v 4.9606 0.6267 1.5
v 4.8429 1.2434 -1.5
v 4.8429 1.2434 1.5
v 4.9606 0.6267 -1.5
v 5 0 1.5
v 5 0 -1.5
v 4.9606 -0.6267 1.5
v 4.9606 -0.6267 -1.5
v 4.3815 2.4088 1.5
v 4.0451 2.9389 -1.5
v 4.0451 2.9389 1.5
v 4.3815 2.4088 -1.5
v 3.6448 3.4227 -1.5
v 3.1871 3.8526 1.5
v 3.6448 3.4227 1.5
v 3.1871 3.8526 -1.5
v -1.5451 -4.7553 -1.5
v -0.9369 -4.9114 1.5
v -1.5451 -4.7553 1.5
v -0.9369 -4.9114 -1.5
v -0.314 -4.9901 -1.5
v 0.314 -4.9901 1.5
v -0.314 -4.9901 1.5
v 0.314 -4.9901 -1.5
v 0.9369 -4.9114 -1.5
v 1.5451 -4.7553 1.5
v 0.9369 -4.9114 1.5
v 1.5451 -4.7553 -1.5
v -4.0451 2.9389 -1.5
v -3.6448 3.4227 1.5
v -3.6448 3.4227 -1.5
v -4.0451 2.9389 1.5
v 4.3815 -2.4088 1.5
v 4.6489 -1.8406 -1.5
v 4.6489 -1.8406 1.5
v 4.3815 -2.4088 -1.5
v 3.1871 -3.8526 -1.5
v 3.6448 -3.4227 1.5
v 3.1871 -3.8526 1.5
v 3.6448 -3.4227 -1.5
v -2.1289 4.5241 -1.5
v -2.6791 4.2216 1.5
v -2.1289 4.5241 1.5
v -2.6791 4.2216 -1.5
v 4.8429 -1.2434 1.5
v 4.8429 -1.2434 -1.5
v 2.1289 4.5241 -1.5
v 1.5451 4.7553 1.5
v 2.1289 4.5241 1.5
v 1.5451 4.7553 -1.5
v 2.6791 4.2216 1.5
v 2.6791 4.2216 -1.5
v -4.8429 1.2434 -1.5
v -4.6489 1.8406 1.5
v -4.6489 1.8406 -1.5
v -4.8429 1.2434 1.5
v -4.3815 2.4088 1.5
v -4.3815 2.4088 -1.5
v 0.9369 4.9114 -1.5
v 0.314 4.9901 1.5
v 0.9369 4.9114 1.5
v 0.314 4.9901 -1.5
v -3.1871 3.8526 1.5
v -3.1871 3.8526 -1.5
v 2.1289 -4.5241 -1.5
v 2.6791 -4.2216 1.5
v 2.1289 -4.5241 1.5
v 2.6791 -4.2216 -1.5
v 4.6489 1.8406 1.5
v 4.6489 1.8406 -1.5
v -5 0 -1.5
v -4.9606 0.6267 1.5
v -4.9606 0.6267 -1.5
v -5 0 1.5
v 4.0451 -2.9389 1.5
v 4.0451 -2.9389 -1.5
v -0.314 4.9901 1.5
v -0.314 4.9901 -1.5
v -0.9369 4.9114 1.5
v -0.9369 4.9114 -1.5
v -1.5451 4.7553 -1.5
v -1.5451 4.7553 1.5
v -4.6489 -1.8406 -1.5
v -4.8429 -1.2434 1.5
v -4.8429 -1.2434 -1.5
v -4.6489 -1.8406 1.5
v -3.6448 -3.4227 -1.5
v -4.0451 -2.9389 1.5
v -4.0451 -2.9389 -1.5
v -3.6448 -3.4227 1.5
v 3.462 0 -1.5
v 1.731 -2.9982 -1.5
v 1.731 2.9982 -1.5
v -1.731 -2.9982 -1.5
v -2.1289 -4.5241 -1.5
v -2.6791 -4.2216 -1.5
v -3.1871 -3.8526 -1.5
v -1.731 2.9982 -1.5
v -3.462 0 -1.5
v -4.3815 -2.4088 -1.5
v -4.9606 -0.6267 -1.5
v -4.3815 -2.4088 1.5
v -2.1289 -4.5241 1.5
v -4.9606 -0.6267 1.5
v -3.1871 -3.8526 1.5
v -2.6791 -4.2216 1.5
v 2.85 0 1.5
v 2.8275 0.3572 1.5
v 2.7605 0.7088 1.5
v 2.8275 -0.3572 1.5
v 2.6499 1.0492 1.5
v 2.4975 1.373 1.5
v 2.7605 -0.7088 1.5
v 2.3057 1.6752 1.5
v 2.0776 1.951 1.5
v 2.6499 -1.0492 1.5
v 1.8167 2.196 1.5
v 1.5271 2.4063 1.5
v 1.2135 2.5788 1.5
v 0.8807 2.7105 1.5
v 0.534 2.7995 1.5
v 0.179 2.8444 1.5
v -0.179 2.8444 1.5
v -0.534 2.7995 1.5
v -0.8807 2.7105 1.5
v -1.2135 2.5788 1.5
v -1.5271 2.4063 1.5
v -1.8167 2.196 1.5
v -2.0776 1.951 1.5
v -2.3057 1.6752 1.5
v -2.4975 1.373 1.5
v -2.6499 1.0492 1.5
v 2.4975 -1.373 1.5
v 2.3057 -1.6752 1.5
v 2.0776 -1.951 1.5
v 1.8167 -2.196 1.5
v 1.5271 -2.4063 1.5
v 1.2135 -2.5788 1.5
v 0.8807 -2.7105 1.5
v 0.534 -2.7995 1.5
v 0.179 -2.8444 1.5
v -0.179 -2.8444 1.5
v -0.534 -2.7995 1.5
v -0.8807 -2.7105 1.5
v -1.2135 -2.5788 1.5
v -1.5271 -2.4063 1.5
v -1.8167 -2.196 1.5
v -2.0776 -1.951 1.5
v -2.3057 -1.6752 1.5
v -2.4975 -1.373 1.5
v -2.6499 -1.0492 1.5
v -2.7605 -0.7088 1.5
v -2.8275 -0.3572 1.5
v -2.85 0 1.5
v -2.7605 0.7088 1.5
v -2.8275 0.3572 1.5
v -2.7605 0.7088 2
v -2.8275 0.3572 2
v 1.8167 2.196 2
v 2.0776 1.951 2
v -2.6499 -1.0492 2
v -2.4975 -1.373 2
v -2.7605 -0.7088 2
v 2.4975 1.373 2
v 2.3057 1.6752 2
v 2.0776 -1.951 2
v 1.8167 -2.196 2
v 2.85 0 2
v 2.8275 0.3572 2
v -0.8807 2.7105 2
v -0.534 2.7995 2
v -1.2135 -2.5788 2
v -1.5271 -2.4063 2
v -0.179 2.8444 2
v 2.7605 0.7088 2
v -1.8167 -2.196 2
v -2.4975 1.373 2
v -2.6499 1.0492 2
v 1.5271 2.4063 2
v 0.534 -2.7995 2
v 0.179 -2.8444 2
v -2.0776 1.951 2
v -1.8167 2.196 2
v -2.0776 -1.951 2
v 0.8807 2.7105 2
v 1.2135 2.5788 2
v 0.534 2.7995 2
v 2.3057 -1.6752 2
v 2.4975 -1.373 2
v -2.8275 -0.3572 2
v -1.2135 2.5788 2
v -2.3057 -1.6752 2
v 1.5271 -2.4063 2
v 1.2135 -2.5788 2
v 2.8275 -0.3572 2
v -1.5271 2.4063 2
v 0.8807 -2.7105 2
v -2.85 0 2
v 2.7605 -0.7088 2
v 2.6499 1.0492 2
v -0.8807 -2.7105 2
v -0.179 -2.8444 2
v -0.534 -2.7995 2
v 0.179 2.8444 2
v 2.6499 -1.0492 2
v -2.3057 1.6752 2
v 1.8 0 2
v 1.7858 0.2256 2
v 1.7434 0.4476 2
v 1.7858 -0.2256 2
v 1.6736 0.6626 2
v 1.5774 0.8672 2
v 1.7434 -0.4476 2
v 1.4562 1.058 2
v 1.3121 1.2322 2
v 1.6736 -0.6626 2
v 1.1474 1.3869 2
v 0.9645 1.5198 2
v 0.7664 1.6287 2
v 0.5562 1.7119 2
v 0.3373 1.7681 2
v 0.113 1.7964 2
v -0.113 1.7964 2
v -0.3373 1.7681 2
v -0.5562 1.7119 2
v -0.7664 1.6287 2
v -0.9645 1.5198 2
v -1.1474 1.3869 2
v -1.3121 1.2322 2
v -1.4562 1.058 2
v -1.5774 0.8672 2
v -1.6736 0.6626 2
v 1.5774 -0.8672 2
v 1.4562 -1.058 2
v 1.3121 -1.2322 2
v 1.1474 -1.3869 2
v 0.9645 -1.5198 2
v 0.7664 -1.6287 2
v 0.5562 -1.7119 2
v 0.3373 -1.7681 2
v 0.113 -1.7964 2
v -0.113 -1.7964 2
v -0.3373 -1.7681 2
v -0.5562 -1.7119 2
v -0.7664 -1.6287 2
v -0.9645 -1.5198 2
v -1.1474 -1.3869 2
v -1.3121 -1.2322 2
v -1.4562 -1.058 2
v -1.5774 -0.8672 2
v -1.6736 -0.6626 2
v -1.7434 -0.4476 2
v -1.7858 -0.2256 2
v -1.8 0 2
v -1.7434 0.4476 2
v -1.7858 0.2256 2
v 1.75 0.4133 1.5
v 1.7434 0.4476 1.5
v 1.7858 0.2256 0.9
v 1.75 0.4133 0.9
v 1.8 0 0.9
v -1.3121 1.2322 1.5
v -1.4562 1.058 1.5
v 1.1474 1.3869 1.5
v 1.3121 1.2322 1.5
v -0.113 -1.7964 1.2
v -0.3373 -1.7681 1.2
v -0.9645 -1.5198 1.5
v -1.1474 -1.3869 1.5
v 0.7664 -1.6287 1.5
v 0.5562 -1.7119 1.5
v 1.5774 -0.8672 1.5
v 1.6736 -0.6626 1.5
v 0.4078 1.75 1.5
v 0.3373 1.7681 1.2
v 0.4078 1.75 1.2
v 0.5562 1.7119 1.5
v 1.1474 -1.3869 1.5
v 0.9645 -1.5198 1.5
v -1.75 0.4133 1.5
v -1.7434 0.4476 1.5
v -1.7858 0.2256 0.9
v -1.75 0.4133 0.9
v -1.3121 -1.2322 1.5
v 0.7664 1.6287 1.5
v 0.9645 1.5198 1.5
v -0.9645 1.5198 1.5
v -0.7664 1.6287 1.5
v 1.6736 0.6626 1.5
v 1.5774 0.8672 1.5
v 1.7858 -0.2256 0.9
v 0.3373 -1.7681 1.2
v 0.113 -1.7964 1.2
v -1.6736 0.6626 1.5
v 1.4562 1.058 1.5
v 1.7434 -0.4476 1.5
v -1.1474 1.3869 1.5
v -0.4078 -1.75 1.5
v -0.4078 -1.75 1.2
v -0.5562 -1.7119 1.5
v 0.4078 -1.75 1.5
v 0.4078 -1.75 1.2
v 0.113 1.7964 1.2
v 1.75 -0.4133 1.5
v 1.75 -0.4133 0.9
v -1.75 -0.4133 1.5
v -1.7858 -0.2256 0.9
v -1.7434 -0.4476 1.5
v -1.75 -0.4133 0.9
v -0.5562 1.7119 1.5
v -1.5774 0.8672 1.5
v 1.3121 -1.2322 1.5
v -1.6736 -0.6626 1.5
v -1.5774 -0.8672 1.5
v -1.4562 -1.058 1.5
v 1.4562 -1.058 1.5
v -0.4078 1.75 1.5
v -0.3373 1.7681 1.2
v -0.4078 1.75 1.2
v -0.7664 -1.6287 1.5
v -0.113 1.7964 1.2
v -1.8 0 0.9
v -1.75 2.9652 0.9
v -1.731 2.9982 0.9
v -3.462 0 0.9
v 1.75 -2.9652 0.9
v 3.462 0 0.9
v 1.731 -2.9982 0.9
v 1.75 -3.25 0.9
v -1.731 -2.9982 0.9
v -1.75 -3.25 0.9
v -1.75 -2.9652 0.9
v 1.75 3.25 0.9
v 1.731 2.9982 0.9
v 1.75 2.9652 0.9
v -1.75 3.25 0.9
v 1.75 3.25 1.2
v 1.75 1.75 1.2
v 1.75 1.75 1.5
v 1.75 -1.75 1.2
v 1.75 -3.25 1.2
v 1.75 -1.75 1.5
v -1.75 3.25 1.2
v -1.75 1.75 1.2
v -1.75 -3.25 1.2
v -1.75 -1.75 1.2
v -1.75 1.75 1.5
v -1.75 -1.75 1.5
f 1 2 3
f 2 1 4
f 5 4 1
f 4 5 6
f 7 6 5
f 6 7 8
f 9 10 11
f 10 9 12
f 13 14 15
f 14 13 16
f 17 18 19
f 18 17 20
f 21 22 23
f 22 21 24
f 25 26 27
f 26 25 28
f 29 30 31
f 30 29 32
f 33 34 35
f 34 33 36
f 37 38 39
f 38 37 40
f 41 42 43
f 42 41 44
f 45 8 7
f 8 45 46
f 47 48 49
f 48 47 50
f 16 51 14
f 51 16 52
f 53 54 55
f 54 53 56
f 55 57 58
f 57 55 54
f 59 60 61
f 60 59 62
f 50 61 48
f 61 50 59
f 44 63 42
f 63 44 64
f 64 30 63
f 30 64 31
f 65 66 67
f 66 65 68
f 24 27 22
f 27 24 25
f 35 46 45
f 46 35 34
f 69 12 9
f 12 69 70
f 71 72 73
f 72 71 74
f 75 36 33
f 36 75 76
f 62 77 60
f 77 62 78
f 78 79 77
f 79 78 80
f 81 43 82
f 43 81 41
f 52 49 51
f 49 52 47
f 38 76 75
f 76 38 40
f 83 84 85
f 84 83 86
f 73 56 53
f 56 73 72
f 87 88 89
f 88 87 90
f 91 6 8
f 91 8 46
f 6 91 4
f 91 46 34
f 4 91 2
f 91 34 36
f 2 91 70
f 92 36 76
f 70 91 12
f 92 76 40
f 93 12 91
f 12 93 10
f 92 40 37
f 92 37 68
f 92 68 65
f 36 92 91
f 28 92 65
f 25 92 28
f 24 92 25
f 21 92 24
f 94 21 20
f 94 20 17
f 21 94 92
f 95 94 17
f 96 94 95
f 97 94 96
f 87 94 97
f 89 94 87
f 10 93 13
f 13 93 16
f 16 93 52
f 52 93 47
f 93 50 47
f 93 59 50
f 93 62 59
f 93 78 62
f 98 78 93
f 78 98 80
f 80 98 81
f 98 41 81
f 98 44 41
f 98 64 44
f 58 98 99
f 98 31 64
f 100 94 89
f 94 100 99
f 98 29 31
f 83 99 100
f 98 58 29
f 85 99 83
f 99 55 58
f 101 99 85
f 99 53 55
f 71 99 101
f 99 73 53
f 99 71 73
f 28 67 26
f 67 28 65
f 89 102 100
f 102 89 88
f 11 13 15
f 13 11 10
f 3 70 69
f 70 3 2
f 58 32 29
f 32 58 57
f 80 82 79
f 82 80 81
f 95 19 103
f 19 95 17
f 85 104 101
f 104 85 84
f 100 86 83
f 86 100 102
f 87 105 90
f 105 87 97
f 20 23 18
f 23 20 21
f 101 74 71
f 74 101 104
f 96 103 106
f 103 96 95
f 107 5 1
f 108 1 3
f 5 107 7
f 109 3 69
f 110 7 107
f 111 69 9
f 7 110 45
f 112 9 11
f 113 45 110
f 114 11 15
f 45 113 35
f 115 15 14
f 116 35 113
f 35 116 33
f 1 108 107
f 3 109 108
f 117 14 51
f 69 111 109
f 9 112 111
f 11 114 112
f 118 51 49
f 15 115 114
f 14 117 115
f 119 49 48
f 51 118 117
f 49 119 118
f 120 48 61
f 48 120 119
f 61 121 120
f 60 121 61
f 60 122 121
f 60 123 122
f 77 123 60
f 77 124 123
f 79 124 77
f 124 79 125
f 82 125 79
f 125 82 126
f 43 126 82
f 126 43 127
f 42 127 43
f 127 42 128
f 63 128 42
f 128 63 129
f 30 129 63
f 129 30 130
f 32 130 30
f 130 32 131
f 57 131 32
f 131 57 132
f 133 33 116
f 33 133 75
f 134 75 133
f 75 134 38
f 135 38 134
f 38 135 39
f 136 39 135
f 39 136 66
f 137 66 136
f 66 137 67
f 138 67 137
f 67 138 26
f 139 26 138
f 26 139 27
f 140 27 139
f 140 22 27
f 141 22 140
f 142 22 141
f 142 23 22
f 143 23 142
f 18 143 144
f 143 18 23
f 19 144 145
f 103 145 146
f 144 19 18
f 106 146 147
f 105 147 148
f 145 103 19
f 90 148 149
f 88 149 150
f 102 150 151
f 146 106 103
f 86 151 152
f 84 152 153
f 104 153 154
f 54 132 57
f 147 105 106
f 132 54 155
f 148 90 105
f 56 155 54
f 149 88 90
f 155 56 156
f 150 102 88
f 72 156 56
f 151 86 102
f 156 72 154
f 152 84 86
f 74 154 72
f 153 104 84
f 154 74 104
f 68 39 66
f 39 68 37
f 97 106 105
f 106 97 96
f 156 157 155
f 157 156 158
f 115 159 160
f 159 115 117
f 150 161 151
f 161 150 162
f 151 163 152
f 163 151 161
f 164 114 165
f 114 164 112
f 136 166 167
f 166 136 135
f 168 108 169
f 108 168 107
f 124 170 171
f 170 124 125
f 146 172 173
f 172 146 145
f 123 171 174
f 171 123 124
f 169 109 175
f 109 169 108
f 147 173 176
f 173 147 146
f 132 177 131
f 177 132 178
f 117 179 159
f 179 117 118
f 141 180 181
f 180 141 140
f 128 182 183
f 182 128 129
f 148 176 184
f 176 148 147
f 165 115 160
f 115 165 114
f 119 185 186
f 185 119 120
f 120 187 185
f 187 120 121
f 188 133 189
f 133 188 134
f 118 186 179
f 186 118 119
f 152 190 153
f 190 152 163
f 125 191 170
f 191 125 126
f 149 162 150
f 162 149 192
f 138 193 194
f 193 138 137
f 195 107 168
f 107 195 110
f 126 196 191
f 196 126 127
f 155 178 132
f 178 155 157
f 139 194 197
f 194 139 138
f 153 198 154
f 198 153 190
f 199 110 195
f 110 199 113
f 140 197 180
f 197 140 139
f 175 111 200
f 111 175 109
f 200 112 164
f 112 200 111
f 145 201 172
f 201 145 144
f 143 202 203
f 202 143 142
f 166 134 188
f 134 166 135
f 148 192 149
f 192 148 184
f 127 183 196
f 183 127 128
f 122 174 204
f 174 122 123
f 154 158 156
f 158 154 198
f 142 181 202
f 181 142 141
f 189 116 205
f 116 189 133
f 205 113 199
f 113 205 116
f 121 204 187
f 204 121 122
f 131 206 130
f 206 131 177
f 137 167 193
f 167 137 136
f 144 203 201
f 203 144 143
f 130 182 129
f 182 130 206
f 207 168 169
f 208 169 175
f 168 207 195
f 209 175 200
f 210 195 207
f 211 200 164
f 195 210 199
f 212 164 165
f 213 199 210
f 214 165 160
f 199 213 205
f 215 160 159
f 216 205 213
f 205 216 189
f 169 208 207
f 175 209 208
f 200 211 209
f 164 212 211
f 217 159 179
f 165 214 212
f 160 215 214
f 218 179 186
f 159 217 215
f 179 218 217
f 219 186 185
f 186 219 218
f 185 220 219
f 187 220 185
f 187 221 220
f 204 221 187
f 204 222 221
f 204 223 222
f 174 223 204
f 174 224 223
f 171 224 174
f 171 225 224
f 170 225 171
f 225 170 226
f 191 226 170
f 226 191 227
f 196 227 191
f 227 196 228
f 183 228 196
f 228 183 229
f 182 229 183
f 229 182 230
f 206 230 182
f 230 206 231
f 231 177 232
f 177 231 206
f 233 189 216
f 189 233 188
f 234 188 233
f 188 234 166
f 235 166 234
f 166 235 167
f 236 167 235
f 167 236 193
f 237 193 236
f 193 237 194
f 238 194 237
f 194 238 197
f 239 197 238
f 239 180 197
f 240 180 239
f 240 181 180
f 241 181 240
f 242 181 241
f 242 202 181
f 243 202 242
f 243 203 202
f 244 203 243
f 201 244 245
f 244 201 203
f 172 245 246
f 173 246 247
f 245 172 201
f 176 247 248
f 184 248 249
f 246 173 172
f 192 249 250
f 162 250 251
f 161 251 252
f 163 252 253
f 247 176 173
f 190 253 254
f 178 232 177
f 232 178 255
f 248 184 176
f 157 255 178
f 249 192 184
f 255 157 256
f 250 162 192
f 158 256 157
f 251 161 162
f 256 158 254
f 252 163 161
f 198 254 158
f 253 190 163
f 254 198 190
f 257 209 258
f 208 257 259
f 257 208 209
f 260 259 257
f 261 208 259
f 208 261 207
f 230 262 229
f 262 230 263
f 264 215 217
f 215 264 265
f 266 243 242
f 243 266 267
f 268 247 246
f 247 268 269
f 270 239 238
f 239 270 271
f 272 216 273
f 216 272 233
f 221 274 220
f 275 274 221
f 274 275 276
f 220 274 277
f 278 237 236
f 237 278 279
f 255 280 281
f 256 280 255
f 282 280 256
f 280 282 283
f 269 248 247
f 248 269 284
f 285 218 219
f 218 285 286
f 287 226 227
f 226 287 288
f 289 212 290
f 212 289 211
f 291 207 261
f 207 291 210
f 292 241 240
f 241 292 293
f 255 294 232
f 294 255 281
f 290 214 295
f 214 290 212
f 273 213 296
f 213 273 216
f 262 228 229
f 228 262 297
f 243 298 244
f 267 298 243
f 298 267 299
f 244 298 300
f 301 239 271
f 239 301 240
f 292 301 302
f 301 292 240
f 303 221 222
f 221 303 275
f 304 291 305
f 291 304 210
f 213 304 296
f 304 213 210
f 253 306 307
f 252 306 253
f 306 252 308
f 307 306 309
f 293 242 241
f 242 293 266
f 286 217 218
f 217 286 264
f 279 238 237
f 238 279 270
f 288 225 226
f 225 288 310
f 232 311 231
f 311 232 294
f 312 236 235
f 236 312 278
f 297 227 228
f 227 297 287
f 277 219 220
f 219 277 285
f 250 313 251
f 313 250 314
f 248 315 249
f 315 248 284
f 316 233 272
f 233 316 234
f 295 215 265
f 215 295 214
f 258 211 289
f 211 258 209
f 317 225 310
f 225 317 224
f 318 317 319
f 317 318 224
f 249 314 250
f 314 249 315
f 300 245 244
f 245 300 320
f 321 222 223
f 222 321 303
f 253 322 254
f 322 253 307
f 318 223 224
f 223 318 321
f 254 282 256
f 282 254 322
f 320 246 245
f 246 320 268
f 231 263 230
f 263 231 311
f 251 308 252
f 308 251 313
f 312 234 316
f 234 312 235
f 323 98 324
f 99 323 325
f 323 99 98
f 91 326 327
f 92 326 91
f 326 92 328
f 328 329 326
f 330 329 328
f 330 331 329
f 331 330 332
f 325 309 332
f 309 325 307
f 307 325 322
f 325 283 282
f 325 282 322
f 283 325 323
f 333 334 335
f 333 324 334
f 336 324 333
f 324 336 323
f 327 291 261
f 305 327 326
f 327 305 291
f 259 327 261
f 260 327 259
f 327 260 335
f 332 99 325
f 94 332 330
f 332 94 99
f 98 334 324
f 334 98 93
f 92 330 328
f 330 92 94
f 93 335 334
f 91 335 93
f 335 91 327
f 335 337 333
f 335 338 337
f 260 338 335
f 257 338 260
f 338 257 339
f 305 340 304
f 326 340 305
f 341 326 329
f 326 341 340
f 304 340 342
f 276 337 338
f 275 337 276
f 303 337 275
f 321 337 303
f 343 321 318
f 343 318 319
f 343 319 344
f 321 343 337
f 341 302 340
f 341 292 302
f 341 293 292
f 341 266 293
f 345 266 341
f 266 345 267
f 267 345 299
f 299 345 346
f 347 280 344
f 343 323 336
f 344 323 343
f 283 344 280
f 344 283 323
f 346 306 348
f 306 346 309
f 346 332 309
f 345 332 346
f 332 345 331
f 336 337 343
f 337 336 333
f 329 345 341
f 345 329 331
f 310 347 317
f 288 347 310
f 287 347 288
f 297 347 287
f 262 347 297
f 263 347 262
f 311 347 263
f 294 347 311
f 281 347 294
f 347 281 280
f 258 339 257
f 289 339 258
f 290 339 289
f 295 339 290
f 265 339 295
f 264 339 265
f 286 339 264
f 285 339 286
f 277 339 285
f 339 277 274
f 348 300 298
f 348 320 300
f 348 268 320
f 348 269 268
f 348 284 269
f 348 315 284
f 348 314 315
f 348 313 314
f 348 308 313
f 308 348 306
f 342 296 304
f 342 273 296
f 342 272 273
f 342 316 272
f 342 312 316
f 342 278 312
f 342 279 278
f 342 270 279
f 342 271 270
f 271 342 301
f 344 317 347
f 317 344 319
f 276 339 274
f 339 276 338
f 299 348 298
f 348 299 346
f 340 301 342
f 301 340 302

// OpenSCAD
$fn = 50;


difference() {
	union() {
		translate(v = [0, 0, -1.5000000000]) {
			rotate(a = [0, 0, 0]) {
				cylinder(h = 3, r = 5.0000000000);
			}
		}
		translate(v = [0, 0, -1.5000000000]) {
			rotate(a = [0, 0, 0]) {
				cylinder(h = 3.5000000000, r = 2.8500000000);
			}
		}
	}
	union() {
		translate(v = [0, 0, -125.0000000000]) {
			rotate(a = [0, 0, 0]) {
				cylinder(h = 250, r = 1.8000000000);
			}
		}
		translate(v = [0, 0, -2.1000000000]) {
			rotate(a = [0, 0, 0]) {
				#translate(v = [0, 0, 0]) {
					rotate(a = [0, 0, 0]) {
						linear_extrude(height = 3) {
							polygon(points = [[3.4620000000, 0.0000000000], [1.7310000000, 2.9981799479], [-1.7310000000, 2.9981799479], [-3.4620000000, 0.0000000000], [-1.7310000000, -2.9981799479], [1.7310000000, -2.9981799479]]);
						}
					}
				}
			}
		}
		#translate(v = [-1.7500000000, -3.2500000000, 0.9000000000]) {
			rotate(a = [0, 0, 0]) {
				cube(size = [3.5000000000, 6.5000000000, 0.3000000000]);
			}
		}
		#translate(v = [-1.7500000000, -1.7500000000, 1.2000000000]) {
			rotate(a = [0, 0, 0]) {
				cube(size = [3.5000000000, 3.5000000000, 0.3000000000]);
			}
		}
		#translate(v = [-1.7500000000, -3.2500000000, -2.4000000000]) {
			rotate(a = [0, 0, 0]) {
				cube(size = [3.5000000000, 6.5000000000, 0.3000000000]);
			}
		}
		#translate(v = [-1.7500000000, -1.7500000000, -2.7000000000]) {
			rotate(a = [0, 0, 0]) {
				cube(size = [3.5000000000, 3.5000000000, 0.3000000000]);
			}
		}
	}
}
